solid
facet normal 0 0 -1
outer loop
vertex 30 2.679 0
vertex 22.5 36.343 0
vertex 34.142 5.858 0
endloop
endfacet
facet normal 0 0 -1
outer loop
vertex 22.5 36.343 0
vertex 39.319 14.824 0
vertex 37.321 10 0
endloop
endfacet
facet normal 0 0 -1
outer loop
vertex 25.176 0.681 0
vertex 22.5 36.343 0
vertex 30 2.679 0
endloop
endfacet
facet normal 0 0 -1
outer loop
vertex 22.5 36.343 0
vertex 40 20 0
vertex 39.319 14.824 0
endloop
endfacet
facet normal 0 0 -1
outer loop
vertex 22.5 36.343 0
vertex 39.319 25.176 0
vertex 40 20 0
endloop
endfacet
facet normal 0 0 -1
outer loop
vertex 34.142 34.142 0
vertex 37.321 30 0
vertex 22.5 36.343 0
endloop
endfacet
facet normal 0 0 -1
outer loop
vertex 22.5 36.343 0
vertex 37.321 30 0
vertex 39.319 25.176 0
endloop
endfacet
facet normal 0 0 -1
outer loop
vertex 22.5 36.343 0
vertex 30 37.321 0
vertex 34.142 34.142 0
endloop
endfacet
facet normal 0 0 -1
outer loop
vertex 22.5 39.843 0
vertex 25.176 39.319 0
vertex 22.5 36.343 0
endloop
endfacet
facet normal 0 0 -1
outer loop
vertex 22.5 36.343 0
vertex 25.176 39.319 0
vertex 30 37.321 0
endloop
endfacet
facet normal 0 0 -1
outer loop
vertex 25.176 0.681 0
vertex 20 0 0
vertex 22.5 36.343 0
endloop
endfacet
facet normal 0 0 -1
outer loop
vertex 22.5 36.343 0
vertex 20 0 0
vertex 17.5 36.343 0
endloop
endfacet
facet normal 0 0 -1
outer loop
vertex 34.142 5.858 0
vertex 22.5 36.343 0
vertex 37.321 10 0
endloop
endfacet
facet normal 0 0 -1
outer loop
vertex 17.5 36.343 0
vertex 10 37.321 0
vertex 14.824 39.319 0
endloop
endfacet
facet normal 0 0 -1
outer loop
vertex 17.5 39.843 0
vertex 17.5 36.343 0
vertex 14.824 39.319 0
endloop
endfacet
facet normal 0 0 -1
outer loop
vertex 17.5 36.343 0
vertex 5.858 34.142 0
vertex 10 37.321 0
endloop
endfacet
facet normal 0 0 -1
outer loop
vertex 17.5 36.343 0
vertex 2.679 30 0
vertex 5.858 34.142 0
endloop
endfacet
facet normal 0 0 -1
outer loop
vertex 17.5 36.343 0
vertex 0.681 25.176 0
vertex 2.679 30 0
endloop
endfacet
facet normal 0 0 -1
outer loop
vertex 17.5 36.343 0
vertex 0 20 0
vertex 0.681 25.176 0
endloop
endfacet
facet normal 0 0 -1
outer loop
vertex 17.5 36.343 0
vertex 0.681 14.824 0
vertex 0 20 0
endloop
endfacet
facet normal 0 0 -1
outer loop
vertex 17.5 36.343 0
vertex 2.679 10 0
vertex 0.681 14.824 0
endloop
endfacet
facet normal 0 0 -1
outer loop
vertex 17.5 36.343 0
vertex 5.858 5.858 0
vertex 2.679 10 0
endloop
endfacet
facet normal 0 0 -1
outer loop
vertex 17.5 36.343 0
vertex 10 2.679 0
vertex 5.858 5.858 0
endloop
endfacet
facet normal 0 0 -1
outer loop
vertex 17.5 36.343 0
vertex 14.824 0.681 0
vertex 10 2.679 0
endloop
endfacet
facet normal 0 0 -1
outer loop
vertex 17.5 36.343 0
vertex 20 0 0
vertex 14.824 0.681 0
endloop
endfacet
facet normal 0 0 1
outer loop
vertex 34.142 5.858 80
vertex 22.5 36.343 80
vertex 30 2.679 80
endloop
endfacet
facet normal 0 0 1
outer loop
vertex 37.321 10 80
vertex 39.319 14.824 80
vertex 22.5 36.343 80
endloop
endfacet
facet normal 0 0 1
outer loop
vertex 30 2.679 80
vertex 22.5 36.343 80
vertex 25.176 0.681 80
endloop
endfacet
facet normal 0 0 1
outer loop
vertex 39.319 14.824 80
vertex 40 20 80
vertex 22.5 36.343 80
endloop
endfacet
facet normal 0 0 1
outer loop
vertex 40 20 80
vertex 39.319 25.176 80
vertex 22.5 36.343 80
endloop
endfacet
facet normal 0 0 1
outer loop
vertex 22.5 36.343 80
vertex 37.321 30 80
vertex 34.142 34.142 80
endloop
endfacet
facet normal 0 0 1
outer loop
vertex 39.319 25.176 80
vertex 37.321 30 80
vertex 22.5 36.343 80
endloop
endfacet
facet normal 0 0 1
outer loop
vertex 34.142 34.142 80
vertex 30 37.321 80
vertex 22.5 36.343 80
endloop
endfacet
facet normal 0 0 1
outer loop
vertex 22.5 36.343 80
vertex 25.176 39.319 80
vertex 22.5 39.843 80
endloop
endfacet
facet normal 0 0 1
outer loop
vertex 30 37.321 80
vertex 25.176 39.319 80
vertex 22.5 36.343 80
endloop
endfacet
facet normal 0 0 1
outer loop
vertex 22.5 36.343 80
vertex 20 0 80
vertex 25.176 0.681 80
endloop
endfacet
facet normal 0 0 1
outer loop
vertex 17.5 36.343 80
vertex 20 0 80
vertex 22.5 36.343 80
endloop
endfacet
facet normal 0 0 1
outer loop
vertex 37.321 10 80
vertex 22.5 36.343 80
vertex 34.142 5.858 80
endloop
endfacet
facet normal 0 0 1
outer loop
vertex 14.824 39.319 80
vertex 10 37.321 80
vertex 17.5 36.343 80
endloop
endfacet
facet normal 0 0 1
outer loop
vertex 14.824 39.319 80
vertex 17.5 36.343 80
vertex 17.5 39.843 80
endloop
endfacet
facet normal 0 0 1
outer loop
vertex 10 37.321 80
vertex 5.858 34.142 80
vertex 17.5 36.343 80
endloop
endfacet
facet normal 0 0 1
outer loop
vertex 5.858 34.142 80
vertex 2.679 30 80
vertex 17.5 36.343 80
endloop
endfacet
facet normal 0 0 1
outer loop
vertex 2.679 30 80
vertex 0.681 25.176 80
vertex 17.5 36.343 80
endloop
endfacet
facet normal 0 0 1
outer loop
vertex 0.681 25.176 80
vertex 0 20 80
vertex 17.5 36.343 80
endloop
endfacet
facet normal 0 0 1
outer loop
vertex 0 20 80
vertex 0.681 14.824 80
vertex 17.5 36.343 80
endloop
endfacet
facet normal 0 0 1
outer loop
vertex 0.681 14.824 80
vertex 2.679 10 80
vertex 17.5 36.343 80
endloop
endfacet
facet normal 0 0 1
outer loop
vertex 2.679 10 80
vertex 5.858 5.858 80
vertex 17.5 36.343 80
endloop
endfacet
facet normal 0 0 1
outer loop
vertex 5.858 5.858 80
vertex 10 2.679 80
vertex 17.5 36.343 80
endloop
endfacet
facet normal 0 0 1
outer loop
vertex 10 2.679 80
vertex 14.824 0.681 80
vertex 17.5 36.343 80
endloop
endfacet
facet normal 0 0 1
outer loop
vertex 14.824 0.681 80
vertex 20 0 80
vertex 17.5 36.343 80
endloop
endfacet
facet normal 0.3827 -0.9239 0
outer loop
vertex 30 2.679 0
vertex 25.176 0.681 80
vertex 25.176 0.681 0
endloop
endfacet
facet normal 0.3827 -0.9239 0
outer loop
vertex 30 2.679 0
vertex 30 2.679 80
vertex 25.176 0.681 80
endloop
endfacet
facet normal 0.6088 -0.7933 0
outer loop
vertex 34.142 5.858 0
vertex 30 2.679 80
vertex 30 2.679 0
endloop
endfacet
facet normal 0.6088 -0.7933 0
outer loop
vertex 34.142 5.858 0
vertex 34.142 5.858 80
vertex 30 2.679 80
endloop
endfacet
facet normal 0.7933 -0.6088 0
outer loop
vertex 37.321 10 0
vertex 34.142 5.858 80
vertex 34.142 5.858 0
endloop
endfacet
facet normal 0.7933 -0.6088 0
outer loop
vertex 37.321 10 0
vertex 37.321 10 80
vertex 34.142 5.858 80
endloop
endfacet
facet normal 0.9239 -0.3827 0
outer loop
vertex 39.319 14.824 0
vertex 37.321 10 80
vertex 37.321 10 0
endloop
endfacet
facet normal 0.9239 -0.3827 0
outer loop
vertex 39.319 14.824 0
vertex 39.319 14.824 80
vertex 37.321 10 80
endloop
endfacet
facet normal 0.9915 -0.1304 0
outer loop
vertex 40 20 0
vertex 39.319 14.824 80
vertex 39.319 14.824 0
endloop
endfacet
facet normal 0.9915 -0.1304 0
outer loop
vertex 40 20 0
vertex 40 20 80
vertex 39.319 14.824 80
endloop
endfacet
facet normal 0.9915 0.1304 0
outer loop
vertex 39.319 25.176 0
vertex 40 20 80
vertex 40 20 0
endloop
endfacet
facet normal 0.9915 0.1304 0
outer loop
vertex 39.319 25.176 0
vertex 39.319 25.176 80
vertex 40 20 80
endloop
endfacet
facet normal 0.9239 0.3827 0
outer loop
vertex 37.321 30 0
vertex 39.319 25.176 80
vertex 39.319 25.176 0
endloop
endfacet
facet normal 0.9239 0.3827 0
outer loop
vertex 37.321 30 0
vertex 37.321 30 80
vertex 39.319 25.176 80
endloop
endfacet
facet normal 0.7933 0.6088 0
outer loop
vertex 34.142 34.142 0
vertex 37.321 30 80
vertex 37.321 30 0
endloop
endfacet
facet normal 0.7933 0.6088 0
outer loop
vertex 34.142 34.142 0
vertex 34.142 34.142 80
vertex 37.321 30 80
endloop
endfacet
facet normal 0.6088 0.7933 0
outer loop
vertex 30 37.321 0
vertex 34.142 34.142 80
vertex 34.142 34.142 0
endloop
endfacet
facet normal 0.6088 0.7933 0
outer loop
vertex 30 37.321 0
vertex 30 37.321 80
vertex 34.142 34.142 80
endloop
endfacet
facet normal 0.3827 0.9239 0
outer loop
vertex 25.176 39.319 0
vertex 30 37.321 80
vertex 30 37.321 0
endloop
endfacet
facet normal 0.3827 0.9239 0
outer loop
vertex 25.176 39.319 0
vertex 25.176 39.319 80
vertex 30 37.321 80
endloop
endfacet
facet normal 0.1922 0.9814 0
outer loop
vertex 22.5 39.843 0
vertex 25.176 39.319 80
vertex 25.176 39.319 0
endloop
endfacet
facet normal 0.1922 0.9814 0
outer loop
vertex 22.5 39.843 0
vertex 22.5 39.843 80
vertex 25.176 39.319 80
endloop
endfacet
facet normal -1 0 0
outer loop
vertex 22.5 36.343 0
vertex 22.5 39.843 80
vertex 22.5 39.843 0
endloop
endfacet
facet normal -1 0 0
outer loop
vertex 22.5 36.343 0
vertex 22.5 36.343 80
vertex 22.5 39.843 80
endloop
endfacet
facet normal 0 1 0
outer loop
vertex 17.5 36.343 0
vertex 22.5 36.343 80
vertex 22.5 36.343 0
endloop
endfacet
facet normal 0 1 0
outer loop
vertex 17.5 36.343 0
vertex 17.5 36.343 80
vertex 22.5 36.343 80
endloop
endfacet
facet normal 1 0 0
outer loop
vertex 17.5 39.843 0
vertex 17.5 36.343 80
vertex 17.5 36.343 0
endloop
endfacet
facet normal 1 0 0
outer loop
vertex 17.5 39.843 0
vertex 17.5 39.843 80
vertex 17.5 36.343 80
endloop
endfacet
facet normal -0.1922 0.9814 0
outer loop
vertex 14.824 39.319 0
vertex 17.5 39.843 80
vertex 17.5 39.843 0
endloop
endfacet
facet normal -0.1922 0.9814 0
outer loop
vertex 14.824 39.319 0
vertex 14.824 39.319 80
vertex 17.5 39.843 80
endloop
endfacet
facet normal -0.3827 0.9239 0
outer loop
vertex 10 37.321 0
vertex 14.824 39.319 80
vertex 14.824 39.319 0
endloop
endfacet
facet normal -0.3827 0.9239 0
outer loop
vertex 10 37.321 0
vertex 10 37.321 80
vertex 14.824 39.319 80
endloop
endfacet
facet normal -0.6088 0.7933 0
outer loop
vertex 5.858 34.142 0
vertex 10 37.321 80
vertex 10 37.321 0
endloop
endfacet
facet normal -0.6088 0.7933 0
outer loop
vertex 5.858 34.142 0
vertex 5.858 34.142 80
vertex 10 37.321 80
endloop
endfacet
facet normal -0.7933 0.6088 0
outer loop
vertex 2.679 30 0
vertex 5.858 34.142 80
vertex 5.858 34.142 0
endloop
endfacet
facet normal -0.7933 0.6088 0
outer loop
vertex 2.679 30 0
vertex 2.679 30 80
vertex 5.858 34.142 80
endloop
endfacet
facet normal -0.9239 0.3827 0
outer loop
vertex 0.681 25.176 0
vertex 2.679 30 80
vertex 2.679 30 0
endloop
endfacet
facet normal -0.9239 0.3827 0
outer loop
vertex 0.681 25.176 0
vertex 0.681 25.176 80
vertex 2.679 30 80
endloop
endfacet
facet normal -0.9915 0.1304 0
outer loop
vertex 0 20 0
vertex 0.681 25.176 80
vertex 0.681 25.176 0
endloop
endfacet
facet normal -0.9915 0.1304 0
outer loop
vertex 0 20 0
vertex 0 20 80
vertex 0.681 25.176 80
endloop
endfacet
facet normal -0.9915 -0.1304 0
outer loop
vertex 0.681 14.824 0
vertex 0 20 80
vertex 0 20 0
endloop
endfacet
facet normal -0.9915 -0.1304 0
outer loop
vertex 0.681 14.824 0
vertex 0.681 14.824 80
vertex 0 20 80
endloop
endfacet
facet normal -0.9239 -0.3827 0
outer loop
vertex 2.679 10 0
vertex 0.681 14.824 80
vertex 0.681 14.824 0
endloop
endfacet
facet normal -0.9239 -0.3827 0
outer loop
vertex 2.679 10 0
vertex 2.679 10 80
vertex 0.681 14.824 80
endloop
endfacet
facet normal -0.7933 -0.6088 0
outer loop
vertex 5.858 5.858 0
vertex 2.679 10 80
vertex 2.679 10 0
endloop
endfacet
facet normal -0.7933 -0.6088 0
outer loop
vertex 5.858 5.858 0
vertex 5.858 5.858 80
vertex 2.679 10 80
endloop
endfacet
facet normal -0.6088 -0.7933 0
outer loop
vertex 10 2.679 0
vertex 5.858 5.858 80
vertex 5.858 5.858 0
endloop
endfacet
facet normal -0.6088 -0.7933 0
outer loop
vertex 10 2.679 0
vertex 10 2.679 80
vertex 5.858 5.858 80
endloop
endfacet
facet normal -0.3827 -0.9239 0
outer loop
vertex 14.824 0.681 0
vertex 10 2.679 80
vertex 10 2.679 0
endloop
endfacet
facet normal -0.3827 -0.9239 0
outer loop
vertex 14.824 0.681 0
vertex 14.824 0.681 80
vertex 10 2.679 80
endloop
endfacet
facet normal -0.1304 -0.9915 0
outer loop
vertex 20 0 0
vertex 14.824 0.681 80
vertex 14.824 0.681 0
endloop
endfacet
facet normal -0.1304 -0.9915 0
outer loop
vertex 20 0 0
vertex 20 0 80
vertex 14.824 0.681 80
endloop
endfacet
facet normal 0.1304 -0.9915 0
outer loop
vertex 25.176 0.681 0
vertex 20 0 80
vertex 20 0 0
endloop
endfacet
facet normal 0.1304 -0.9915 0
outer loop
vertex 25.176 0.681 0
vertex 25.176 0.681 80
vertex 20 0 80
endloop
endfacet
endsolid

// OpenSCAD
$fn = 32;

// ----------------------------------------------------------------------
// Keyway shaft: d40 shaft, key 5 x 3.5 mm
// ----------------------------------------------------------------------

// --- parameters (mm) ---
shaft_r = 20;             // shaft radius
key_w = 5;                // keyway width
key_d = 3.5;              // keyway depth below the surface line
plate_t = 80;             // shaft length, Z (extrusion height)

shaft_d = 2 * shaft_r;  // shaft diameter
circle_step = 15;  // polygon sampling step, degrees

profile = [[14.824, 39.319], [10, 37.321], [5.858, 34.142], [2.679, 30], [0.681, 25.176], [0, 20], [0.681, 14.824], [2.679, 10], [5.858, 5.858], [10, 2.679], [14.824, 0.681], [20, 0], [25.176, 0.681], [30, 2.679], [34.142, 5.858], [37.321, 10], [39.319, 14.824], [40, 20], [39.319, 25.176], [37.321, 30], [34.142, 34.142], [30, 37.321], [25.176, 39.319], [22.5, 39.843], [22.5, 36.343], [17.5, 36.343], [17.5, 39.843]];  // primary outline, 27 points, counter clockwise

// --- the one profile operation ---
linear_extrude(height = plate_t) polygon(points = profile);
